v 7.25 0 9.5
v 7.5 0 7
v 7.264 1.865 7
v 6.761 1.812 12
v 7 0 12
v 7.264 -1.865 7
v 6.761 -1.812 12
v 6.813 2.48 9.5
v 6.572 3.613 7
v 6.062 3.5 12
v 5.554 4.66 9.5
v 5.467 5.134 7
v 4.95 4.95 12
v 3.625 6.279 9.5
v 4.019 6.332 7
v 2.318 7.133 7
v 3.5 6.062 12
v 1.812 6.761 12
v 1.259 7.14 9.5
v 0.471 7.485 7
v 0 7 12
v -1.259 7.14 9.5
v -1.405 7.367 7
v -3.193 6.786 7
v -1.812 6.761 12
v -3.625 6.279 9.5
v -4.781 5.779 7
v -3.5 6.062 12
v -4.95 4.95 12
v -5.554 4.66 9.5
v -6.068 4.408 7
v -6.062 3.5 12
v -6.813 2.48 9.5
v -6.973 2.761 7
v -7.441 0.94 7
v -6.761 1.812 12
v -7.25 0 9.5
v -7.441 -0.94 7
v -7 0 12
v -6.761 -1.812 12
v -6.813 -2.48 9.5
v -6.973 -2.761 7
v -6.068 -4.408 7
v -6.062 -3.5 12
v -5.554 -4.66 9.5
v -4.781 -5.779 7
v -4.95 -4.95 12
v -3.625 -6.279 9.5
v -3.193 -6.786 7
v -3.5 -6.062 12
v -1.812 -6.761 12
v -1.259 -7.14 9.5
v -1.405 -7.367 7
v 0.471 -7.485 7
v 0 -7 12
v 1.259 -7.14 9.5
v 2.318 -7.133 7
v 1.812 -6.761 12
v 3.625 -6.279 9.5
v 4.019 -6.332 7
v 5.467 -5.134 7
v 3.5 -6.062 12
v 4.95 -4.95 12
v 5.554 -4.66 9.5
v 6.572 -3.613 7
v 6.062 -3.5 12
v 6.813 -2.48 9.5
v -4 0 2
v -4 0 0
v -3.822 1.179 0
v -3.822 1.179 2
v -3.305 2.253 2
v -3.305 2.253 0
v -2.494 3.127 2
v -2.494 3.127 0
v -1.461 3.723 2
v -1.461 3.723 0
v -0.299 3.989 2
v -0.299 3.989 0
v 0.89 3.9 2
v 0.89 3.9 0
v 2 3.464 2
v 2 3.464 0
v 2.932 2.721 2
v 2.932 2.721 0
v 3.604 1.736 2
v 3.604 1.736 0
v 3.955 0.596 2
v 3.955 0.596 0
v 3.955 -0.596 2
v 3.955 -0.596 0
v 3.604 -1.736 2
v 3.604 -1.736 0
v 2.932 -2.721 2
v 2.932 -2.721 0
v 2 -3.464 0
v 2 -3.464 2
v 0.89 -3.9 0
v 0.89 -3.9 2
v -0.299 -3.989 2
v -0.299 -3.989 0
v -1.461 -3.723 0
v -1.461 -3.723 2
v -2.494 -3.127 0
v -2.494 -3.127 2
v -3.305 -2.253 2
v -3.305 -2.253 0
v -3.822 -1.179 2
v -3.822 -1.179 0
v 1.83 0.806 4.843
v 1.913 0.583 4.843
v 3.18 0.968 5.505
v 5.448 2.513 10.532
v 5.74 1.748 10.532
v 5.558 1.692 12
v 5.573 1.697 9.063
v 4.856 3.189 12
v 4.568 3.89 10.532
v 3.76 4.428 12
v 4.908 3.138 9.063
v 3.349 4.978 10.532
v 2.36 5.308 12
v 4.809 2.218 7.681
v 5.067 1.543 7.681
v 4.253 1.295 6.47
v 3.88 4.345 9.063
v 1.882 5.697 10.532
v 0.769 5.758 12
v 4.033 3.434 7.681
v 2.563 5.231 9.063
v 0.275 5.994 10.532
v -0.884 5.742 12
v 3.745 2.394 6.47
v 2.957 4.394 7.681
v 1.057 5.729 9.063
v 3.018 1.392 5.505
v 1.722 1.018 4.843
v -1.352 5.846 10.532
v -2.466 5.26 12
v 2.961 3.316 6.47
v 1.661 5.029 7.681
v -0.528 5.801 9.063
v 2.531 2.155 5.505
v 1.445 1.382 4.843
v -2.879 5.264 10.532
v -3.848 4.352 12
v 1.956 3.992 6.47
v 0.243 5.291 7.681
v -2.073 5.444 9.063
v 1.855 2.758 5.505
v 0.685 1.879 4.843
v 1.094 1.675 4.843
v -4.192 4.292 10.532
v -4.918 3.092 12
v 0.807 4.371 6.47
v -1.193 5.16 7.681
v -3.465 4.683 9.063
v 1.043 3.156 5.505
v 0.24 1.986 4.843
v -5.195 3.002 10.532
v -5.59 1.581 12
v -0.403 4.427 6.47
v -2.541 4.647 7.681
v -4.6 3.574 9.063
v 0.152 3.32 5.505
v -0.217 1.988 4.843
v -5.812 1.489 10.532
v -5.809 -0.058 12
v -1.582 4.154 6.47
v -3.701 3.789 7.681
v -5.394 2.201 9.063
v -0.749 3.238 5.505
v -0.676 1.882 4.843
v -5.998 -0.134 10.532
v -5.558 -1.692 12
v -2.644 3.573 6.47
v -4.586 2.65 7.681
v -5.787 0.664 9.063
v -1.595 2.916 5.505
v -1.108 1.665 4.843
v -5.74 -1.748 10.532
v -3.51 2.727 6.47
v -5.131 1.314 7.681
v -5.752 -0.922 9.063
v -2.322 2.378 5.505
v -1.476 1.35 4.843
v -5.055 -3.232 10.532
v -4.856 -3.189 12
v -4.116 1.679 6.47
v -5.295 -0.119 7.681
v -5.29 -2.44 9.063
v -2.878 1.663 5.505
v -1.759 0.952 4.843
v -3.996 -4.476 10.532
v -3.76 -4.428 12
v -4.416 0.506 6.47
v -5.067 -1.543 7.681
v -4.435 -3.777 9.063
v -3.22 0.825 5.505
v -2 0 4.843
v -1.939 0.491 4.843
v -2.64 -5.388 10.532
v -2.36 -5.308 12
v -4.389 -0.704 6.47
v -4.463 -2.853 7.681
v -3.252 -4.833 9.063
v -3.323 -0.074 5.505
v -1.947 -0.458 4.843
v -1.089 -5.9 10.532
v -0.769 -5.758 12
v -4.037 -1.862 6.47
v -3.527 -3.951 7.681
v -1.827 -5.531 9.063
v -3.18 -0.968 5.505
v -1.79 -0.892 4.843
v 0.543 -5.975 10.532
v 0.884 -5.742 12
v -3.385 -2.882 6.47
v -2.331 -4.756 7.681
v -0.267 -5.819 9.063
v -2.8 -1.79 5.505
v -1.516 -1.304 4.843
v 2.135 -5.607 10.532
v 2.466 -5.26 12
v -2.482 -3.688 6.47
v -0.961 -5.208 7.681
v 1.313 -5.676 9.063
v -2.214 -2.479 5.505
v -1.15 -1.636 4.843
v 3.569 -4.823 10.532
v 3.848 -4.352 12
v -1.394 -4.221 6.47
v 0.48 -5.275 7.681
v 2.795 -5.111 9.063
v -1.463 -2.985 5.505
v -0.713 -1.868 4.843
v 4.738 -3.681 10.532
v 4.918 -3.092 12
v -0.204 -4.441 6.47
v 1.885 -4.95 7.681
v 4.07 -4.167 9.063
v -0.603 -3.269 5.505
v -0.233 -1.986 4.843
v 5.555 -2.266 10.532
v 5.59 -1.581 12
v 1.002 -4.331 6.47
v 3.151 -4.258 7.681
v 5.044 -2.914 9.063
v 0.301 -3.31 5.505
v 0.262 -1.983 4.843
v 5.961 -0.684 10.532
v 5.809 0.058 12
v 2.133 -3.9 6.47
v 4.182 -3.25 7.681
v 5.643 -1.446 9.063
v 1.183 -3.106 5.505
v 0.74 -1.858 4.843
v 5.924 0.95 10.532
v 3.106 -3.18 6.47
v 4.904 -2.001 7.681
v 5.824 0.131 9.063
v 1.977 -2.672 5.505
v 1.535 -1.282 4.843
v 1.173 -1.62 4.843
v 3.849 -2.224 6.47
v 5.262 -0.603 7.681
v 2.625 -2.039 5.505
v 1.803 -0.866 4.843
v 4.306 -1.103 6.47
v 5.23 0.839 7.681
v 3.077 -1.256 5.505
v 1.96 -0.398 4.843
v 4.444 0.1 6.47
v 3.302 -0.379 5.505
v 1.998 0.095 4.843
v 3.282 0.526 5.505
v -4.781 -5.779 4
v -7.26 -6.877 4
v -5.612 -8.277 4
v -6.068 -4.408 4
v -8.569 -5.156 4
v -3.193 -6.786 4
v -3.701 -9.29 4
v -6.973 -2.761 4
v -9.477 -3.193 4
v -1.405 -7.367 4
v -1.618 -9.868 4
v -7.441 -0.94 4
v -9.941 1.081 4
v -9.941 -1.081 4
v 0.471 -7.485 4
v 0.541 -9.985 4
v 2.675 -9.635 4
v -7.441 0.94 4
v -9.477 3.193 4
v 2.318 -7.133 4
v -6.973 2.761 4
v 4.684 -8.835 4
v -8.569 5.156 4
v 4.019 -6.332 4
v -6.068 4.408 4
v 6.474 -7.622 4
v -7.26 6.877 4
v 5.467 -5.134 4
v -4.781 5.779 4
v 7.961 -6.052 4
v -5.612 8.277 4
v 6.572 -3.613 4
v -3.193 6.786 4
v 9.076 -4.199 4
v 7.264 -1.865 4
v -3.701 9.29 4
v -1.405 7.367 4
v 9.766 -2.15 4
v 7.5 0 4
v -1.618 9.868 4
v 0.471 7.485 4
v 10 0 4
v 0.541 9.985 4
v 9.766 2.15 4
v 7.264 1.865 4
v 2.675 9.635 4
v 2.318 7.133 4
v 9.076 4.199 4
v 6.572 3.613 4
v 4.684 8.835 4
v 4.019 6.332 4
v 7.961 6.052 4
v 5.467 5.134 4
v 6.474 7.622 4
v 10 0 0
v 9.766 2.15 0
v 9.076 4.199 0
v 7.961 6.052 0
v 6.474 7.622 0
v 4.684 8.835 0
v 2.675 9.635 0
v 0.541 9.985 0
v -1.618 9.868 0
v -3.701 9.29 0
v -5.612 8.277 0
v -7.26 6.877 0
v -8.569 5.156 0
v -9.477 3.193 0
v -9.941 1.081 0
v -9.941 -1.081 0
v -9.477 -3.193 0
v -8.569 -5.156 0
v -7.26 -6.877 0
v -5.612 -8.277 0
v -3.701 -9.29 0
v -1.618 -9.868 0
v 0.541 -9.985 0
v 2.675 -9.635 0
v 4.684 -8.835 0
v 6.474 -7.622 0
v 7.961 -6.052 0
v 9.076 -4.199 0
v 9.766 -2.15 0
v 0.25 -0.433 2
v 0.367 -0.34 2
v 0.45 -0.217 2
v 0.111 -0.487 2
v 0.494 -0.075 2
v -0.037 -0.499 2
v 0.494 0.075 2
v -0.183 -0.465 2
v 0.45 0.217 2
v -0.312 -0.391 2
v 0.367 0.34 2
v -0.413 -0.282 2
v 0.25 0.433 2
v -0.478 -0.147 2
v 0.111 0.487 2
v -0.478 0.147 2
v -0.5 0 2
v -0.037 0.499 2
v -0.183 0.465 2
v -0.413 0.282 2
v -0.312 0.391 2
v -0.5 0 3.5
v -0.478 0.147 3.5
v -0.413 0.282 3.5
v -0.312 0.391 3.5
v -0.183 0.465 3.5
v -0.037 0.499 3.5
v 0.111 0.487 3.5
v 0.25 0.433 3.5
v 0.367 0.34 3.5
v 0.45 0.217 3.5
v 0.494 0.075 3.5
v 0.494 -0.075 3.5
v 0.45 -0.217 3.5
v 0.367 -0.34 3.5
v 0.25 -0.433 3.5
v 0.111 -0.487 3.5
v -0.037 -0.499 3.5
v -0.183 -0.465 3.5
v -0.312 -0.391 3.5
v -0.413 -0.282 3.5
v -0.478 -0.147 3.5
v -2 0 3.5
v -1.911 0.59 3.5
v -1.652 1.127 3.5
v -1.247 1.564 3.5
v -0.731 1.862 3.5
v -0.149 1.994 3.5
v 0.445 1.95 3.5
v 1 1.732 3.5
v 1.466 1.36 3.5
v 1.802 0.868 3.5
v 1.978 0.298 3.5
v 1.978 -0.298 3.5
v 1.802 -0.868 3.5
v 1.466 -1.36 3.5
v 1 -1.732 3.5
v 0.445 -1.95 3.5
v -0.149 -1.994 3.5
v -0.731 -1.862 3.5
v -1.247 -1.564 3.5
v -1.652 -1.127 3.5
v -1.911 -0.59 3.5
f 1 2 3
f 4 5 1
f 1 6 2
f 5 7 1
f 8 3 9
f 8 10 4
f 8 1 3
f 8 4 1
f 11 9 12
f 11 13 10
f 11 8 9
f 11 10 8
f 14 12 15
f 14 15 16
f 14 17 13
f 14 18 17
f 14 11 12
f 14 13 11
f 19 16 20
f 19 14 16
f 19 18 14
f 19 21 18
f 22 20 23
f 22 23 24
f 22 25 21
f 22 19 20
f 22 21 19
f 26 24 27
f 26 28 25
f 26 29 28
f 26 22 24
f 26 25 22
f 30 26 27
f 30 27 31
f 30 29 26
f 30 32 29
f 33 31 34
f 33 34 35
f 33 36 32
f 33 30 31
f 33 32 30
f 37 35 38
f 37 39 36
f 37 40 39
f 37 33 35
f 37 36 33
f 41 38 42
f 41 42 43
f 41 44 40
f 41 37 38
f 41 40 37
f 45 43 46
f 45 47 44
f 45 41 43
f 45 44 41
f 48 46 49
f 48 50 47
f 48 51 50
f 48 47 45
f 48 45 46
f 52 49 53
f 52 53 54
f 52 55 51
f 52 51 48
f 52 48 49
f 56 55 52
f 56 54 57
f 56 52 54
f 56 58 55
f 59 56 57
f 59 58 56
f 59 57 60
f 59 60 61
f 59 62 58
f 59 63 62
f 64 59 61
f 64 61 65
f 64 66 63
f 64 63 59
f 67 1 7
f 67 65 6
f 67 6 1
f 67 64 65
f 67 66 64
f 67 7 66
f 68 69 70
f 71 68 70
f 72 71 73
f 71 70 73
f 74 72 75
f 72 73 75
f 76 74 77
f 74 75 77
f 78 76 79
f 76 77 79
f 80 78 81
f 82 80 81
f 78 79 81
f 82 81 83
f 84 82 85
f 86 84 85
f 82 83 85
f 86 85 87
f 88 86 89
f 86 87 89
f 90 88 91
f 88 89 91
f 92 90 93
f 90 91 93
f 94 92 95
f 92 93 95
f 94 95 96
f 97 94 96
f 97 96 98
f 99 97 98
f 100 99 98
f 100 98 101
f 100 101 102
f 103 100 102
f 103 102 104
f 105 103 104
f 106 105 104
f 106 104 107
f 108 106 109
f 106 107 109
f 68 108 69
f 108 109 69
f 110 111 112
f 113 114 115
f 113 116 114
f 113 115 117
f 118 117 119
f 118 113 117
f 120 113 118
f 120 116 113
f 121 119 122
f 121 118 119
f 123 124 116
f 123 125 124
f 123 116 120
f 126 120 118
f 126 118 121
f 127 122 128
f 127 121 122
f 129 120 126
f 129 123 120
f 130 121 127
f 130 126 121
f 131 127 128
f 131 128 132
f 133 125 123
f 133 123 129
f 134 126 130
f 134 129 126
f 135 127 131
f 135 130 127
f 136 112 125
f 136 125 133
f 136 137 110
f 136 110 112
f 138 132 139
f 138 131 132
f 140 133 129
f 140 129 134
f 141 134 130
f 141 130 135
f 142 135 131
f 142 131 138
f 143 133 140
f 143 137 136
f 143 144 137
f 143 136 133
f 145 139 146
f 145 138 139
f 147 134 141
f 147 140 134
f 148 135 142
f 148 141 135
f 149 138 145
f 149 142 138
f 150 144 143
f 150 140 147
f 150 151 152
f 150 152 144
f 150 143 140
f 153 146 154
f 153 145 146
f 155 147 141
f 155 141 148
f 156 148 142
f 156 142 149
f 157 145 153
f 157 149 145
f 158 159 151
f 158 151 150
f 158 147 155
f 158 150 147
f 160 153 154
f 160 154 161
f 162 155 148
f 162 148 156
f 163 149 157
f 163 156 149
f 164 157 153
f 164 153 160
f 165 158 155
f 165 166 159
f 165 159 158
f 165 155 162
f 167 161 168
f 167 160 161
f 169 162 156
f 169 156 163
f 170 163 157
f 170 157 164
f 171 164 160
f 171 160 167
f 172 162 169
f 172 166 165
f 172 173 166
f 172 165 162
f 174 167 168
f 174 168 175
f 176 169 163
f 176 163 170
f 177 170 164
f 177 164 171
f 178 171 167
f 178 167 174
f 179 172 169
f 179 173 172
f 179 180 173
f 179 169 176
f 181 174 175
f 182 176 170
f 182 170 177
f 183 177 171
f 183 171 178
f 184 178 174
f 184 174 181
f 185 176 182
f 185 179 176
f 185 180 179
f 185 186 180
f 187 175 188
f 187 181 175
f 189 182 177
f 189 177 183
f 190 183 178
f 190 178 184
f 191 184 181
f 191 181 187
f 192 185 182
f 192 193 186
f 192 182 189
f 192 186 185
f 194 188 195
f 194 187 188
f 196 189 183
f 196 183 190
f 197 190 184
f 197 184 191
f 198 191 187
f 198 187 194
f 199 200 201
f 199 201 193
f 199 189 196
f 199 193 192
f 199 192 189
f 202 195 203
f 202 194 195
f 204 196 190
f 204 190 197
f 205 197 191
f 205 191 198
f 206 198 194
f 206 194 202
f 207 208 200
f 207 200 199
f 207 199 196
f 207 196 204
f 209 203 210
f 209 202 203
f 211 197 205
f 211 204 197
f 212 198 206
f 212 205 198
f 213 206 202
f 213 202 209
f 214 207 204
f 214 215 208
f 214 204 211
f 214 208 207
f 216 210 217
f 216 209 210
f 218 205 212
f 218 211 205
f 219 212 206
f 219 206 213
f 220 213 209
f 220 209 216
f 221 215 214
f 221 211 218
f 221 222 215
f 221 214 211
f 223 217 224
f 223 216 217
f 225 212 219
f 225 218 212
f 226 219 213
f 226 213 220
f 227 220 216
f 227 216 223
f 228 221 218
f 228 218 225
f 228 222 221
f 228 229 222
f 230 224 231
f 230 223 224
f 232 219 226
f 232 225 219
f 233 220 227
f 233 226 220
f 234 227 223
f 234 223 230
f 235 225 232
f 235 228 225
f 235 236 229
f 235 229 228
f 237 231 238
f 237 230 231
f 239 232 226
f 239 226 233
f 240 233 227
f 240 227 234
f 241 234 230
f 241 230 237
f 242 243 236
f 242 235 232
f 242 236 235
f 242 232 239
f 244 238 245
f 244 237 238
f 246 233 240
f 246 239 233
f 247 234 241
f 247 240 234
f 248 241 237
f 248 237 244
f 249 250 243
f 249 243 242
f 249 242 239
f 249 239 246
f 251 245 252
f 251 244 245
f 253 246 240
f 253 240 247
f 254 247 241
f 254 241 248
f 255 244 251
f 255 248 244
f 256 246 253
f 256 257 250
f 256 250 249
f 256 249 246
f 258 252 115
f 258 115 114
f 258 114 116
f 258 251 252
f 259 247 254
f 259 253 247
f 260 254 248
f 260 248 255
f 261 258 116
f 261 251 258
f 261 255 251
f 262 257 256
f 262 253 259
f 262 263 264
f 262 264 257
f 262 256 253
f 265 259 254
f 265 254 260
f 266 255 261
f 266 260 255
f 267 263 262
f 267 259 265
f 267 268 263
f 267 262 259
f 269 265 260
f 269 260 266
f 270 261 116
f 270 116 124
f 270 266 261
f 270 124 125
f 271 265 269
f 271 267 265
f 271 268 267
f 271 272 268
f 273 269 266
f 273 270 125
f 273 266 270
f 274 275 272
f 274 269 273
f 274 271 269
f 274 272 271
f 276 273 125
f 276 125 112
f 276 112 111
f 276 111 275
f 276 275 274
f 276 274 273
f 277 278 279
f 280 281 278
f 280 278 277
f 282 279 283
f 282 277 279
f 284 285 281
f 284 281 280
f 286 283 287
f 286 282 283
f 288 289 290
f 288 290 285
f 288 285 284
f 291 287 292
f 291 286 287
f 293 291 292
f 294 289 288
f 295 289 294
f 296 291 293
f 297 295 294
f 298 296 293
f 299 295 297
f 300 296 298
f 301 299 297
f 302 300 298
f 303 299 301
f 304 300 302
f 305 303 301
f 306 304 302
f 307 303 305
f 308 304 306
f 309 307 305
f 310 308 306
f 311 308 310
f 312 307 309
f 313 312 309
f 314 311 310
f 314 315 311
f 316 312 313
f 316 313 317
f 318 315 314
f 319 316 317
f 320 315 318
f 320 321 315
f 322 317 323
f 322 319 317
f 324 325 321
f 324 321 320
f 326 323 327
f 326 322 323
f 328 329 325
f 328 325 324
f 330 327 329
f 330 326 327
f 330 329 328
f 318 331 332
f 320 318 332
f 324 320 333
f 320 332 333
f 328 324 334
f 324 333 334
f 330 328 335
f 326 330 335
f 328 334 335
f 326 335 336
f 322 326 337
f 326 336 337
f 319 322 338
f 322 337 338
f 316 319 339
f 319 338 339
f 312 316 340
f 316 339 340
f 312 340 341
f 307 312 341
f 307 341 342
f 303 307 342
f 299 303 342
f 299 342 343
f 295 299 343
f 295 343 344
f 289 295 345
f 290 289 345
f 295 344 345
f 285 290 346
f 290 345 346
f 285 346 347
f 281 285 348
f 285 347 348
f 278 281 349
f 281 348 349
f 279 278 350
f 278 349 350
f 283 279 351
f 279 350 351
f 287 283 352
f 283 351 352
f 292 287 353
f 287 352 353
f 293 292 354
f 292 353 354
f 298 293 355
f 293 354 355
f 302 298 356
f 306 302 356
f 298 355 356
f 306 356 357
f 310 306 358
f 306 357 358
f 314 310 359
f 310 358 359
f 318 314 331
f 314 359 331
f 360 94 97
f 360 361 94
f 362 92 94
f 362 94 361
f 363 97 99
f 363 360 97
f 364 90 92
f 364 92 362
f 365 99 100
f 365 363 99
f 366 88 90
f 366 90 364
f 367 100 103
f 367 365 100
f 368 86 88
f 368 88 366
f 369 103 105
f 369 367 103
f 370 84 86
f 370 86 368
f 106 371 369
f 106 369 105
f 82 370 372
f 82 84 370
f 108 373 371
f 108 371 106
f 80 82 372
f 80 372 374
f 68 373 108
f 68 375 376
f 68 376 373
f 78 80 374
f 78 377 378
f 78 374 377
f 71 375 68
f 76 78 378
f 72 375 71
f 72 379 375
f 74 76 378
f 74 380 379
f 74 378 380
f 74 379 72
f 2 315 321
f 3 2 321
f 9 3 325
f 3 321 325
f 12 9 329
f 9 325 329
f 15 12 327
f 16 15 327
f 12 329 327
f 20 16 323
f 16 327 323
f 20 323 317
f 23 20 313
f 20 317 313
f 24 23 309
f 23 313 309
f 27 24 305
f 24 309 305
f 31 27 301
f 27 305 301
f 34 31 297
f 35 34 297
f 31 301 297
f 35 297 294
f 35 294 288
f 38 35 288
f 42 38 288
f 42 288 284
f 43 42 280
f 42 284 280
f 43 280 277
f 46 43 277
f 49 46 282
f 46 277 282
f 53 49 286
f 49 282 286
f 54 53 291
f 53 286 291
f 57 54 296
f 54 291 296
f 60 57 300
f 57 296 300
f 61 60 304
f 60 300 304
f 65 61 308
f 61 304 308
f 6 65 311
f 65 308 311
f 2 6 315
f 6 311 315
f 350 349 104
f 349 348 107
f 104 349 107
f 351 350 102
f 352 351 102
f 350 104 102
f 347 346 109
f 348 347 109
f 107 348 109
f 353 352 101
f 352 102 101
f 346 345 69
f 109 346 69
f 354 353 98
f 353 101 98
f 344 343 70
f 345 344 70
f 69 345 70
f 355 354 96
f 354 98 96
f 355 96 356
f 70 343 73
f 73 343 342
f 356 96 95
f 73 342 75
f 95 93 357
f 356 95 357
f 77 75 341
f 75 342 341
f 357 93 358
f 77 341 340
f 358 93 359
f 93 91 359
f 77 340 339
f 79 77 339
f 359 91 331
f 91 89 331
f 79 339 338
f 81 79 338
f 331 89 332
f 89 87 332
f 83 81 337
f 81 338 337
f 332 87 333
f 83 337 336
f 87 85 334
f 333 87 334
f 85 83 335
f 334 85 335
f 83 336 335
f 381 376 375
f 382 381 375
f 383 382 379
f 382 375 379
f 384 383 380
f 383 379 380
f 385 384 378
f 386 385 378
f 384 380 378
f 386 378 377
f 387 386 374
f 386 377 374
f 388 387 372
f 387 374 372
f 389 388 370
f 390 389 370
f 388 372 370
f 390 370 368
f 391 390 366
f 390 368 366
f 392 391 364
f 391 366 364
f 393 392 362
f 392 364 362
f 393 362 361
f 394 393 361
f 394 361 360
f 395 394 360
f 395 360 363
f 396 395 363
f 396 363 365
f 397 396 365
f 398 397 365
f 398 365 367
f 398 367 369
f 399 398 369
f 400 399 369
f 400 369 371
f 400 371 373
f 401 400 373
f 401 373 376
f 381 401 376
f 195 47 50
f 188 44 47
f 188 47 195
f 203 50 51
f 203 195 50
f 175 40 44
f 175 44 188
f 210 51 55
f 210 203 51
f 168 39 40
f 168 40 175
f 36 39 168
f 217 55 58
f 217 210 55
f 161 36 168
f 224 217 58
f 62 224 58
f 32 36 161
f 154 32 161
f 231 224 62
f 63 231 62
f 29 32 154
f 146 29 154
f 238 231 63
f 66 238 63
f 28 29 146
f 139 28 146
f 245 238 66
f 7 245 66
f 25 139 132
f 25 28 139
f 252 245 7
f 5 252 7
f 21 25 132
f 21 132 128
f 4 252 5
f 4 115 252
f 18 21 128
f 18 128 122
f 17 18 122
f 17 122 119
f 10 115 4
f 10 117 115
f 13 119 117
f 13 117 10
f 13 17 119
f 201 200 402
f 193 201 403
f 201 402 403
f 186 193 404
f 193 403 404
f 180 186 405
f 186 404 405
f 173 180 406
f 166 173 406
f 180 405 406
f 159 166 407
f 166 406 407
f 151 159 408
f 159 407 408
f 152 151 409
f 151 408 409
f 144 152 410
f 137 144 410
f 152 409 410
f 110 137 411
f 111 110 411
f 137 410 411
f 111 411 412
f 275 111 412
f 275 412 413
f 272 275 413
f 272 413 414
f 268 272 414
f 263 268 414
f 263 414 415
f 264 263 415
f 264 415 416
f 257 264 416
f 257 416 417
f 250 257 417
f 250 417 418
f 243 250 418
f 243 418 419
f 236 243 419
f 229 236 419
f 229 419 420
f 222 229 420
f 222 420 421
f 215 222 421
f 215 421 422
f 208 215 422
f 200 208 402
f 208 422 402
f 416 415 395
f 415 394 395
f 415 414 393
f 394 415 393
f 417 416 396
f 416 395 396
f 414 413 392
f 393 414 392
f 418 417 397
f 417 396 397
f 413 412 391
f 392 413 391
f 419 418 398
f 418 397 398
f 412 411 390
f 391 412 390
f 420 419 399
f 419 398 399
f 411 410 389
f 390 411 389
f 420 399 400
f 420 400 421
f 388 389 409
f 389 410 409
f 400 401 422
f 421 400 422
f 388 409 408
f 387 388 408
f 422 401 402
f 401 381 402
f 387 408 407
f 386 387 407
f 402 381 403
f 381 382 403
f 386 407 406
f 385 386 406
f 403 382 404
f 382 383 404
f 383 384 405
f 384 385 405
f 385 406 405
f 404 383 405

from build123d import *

# Parameters (mm, degrees)
SKETCH_1_R          = 10
EXTRUDE_1_DEPTH     = 4
SKETCH_3_R          = 7
EXTRUDE_2_DEPTH     = 12
SKETCH_4_R          = 7.5
EXTRUDE_3_DEPTH     = 3
SKETCH_5_R          = 4
CUT_EXTRUDE_1_DEPTH = 2
SKETCH_6_R          = 0.5
CUT_EXTRUDE_2_DEPTH = 18.320508076
CUT_EXTRUDE_START   = -1.5
SKETCH_7_R          = 2
CUT_EXTRUDE_3_DEPTH = 16.820508076


# Read off the part's stored shape, not the designer's step: 边界1
with BuildPart() as part:
    # 草图1 → 凸台-拉伸1 (new body)
    with BuildSketch(Plane.XY):
        Circle(SKETCH_1_R)
    extrude(amount=EXTRUDE_1_DEPTH)

    # 草图3 → 凸台-拉伸2 (add)
    with BuildSketch(Plane.XY):
        Circle(SKETCH_3_R)
    extrude(amount=EXTRUDE_2_DEPTH)

    # 草图4 → 凸台-拉伸3 (add)
    with BuildSketch(Plane.XY.offset(4)):
        Circle(SKETCH_4_R)
    extrude(amount=EXTRUDE_3_DEPTH)

    # 边界1 outline → 边界1 (revolve)
    with BuildSketch(Plane.XZ):
        Polygon((7.5, 7), (7, 12), (7, 7), align=None)
    revolve(axis=Axis((0, 0, 0), (0, 0, 1)))

    # 草图5 → 切除-拉伸1 (cut)
    with BuildSketch(Plane(origin=(0, 0, 0), x_dir=(-1, 0, 0), z_dir=(0, 0, -1))):
        Circle(SKETCH_5_R)
    extrude(amount=-CUT_EXTRUDE_1_DEPTH, mode=Mode.SUBTRACT)

    # 草图6 → 切除-拉伸2 (cut, through all)
    with BuildSketch(Plane(origin=(0, 0, 2), x_dir=(-1, 0, 0), z_dir=(0, 0, -1))):
        Circle(SKETCH_6_R)
    extrude(amount=-CUT_EXTRUDE_2_DEPTH, mode=Mode.SUBTRACT)

    # 草图7 → 切除-拉伸3 (cut, through all)
    with BuildSketch(Plane(origin=(0, 0, 2), x_dir=(-1, 0, 0), z_dir=(0, 0, -1)).offset(CUT_EXTRUDE_START)):
        Circle(SKETCH_7_R)
    extrude(amount=-CUT_EXTRUDE_3_DEPTH, mode=Mode.SUBTRACT)

    # 草图8 → 切除-旋转1 (revolve, cut)
    with BuildSketch(Plane(origin=(0, 0, 0), x_dir=(0, 0, -1), z_dir=(1, 0, 0)), mode=Mode.PRIVATE) as cut_revolve_1_sk:
        with BuildLine():
            Line((-12, 0), (-12, 5.809475019))
            ThreePointArc((-12, 5.809475019), (-6.825765386, 4.74341649), (-4.5, 0))
            Line((-4.5, 0), (-12, 0))
        make_face()
    revolve(cut_revolve_1_sk.sketch.rotate(Axis((0, 0, 12), (0, 0, 1)), 286.935860908), axis=Axis((0, 0, 12), (0, 0, 1)), mode=Mode.SUBTRACT)


solid = part.part
